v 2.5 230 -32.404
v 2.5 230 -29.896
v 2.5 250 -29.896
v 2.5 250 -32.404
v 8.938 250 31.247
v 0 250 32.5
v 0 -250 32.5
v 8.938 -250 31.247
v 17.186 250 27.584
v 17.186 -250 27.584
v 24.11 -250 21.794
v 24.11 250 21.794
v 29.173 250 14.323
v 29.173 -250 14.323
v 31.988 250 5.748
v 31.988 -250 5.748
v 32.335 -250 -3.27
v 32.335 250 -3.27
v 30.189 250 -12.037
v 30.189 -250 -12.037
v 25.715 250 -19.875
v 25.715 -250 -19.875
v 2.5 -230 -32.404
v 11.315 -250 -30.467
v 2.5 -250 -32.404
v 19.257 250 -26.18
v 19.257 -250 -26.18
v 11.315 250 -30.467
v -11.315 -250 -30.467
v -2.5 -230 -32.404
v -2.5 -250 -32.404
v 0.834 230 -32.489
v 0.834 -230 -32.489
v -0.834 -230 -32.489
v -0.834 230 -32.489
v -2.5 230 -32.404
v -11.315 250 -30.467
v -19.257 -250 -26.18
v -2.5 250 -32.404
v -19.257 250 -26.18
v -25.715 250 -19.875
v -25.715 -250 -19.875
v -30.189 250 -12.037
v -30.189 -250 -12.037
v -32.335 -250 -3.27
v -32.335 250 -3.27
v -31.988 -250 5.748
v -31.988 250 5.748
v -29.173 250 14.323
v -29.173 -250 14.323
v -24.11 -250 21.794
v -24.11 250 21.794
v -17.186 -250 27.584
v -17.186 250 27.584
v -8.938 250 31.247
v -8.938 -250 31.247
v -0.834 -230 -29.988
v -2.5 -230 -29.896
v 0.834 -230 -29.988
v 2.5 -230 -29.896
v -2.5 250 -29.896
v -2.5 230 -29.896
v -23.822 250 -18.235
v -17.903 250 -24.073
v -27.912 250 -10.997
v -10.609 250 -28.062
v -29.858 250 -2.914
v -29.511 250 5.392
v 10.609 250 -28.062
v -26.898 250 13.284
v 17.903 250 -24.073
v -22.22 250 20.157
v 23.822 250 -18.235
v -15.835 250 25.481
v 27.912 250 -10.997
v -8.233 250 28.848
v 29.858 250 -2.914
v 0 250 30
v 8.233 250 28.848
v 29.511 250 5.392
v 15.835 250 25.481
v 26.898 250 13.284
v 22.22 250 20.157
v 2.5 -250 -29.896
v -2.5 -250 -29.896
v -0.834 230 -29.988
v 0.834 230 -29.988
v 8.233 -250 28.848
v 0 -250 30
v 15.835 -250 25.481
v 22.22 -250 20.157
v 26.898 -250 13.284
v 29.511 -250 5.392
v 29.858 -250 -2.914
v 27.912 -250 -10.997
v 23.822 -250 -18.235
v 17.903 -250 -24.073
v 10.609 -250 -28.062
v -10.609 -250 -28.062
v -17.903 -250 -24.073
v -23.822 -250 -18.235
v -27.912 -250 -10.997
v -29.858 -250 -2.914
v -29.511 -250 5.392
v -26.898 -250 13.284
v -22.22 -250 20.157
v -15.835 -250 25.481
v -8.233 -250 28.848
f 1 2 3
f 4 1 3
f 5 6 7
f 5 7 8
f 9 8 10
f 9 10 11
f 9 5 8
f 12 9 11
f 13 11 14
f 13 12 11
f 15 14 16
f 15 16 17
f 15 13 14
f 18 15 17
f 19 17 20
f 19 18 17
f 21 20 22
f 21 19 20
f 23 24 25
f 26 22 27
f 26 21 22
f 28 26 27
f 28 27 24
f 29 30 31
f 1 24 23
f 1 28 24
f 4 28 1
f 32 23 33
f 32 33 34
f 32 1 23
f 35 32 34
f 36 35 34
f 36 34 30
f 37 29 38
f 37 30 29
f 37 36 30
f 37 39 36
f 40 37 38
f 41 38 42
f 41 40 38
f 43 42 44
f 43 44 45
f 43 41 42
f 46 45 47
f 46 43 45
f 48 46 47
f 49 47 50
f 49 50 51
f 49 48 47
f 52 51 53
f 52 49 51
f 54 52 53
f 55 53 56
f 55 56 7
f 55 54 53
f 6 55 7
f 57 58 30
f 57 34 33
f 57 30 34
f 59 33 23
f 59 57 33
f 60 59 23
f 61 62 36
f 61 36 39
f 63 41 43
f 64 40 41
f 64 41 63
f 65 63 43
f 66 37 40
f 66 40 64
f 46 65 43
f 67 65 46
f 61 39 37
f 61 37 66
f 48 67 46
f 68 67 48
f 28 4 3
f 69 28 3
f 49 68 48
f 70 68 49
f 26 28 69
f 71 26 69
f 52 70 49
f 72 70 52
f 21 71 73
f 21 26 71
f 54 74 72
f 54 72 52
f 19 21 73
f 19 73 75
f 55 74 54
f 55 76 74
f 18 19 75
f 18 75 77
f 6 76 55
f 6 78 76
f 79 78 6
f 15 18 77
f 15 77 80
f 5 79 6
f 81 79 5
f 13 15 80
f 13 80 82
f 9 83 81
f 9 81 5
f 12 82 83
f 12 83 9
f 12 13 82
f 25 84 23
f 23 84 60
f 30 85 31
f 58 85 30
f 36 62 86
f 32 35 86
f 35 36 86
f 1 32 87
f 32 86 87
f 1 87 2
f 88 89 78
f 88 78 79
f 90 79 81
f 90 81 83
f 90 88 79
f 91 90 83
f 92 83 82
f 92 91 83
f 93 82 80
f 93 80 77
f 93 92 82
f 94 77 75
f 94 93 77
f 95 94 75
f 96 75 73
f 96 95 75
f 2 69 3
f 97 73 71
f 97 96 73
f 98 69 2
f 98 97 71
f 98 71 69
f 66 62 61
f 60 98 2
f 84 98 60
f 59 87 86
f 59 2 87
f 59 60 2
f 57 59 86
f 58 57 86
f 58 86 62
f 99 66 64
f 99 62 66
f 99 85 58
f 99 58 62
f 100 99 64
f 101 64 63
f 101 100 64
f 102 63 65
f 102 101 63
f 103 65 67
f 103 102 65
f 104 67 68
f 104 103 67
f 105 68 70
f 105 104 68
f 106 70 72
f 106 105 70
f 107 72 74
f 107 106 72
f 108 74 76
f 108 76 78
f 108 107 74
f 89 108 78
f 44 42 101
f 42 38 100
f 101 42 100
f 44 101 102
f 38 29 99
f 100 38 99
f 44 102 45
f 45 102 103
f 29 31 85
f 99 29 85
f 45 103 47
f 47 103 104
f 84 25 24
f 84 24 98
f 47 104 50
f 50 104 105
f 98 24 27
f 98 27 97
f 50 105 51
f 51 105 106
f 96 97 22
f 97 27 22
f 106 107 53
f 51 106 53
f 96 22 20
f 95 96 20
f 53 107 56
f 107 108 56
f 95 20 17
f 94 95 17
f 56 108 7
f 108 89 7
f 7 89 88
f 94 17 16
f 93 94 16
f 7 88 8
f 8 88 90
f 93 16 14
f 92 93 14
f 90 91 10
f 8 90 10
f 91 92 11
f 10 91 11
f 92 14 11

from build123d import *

# Parameters (mm, degrees)
CROQUIS1_R                 = 32.5
CROQUIS1_R_2               = 30
SALIENTE_EXTRUIR1_DEPTH    = 250
CORTAR_EXTRUIR1_REACH      = 256.19
CORTAR_EXTRUIR1_END_RADIUS = 32.5
CROQUIS2_W                 = 5
CROQUIS2_H                 = 20


with BuildPart() as part:
    # Croquis1 → Saliente-Extruir1 (new, symmetric)
    with BuildSketch(Plane(origin=(0, 0, 0), x_dir=(1, 0, 0), z_dir=(0, 1, 0))):
        with Locations(Location((0, 0, 0), (0, 0, 270))):
            Circle(CROQUIS1_R)
        with Locations(Location((0, 0, 0), (0, 0, 270))):
            Circle(CROQUIS1_R_2, mode=Mode.SUBTRACT)
    extrude(amount=SALIENTE_EXTRUIR1_DEPTH, both=True)

    # Cortar-Extruir1: up to this cylinder (the profile starts inside it)
    cortar_extruir1_end = Plane(origin=(0, 0, 0), z_dir=(0, -1, 0)) * Cylinder(CORTAR_EXTRUIR1_END_RADIUS, 1058.38, mode=Mode.PRIVATE)
    # Croquis2 → Cortar-Extruir1 (cut, up to the surface)
    with BuildSketch(Plane.XY, mode=Mode.PRIVATE) as cortar_extruir1_sk1:
        with Locations((0, -240)):
            Rectangle(CROQUIS2_W, CROQUIS2_H)
    cortar_extruir1_tool1 = extrude(cortar_extruir1_sk1.sketch, amount=-CORTAR_EXTRUIR1_REACH, mode=Mode.PRIVATE) & cortar_extruir1_end
    add(cortar_extruir1_tool1.solids().sort_by_distance((0, -240, 0))[0], mode=Mode.SUBTRACT)
    # Croquis2 → Cortar-Extruir1 (cut, up to the surface)
    with BuildSketch(Plane.XY, mode=Mode.PRIVATE) as cortar_extruir1_sk2:
        with Locations((0, 240)):
            Rectangle(CROQUIS2_W, CROQUIS2_H)
    cortar_extruir1_tool2 = extrude(cortar_extruir1_sk2.sketch, amount=-CORTAR_EXTRUIR1_REACH, mode=Mode.PRIVATE) & cortar_extruir1_end
    add(cortar_extruir1_tool2.solids().sort_by_distance((0, 240, 0))[0], mode=Mode.SUBTRACT)


solid = part.part
